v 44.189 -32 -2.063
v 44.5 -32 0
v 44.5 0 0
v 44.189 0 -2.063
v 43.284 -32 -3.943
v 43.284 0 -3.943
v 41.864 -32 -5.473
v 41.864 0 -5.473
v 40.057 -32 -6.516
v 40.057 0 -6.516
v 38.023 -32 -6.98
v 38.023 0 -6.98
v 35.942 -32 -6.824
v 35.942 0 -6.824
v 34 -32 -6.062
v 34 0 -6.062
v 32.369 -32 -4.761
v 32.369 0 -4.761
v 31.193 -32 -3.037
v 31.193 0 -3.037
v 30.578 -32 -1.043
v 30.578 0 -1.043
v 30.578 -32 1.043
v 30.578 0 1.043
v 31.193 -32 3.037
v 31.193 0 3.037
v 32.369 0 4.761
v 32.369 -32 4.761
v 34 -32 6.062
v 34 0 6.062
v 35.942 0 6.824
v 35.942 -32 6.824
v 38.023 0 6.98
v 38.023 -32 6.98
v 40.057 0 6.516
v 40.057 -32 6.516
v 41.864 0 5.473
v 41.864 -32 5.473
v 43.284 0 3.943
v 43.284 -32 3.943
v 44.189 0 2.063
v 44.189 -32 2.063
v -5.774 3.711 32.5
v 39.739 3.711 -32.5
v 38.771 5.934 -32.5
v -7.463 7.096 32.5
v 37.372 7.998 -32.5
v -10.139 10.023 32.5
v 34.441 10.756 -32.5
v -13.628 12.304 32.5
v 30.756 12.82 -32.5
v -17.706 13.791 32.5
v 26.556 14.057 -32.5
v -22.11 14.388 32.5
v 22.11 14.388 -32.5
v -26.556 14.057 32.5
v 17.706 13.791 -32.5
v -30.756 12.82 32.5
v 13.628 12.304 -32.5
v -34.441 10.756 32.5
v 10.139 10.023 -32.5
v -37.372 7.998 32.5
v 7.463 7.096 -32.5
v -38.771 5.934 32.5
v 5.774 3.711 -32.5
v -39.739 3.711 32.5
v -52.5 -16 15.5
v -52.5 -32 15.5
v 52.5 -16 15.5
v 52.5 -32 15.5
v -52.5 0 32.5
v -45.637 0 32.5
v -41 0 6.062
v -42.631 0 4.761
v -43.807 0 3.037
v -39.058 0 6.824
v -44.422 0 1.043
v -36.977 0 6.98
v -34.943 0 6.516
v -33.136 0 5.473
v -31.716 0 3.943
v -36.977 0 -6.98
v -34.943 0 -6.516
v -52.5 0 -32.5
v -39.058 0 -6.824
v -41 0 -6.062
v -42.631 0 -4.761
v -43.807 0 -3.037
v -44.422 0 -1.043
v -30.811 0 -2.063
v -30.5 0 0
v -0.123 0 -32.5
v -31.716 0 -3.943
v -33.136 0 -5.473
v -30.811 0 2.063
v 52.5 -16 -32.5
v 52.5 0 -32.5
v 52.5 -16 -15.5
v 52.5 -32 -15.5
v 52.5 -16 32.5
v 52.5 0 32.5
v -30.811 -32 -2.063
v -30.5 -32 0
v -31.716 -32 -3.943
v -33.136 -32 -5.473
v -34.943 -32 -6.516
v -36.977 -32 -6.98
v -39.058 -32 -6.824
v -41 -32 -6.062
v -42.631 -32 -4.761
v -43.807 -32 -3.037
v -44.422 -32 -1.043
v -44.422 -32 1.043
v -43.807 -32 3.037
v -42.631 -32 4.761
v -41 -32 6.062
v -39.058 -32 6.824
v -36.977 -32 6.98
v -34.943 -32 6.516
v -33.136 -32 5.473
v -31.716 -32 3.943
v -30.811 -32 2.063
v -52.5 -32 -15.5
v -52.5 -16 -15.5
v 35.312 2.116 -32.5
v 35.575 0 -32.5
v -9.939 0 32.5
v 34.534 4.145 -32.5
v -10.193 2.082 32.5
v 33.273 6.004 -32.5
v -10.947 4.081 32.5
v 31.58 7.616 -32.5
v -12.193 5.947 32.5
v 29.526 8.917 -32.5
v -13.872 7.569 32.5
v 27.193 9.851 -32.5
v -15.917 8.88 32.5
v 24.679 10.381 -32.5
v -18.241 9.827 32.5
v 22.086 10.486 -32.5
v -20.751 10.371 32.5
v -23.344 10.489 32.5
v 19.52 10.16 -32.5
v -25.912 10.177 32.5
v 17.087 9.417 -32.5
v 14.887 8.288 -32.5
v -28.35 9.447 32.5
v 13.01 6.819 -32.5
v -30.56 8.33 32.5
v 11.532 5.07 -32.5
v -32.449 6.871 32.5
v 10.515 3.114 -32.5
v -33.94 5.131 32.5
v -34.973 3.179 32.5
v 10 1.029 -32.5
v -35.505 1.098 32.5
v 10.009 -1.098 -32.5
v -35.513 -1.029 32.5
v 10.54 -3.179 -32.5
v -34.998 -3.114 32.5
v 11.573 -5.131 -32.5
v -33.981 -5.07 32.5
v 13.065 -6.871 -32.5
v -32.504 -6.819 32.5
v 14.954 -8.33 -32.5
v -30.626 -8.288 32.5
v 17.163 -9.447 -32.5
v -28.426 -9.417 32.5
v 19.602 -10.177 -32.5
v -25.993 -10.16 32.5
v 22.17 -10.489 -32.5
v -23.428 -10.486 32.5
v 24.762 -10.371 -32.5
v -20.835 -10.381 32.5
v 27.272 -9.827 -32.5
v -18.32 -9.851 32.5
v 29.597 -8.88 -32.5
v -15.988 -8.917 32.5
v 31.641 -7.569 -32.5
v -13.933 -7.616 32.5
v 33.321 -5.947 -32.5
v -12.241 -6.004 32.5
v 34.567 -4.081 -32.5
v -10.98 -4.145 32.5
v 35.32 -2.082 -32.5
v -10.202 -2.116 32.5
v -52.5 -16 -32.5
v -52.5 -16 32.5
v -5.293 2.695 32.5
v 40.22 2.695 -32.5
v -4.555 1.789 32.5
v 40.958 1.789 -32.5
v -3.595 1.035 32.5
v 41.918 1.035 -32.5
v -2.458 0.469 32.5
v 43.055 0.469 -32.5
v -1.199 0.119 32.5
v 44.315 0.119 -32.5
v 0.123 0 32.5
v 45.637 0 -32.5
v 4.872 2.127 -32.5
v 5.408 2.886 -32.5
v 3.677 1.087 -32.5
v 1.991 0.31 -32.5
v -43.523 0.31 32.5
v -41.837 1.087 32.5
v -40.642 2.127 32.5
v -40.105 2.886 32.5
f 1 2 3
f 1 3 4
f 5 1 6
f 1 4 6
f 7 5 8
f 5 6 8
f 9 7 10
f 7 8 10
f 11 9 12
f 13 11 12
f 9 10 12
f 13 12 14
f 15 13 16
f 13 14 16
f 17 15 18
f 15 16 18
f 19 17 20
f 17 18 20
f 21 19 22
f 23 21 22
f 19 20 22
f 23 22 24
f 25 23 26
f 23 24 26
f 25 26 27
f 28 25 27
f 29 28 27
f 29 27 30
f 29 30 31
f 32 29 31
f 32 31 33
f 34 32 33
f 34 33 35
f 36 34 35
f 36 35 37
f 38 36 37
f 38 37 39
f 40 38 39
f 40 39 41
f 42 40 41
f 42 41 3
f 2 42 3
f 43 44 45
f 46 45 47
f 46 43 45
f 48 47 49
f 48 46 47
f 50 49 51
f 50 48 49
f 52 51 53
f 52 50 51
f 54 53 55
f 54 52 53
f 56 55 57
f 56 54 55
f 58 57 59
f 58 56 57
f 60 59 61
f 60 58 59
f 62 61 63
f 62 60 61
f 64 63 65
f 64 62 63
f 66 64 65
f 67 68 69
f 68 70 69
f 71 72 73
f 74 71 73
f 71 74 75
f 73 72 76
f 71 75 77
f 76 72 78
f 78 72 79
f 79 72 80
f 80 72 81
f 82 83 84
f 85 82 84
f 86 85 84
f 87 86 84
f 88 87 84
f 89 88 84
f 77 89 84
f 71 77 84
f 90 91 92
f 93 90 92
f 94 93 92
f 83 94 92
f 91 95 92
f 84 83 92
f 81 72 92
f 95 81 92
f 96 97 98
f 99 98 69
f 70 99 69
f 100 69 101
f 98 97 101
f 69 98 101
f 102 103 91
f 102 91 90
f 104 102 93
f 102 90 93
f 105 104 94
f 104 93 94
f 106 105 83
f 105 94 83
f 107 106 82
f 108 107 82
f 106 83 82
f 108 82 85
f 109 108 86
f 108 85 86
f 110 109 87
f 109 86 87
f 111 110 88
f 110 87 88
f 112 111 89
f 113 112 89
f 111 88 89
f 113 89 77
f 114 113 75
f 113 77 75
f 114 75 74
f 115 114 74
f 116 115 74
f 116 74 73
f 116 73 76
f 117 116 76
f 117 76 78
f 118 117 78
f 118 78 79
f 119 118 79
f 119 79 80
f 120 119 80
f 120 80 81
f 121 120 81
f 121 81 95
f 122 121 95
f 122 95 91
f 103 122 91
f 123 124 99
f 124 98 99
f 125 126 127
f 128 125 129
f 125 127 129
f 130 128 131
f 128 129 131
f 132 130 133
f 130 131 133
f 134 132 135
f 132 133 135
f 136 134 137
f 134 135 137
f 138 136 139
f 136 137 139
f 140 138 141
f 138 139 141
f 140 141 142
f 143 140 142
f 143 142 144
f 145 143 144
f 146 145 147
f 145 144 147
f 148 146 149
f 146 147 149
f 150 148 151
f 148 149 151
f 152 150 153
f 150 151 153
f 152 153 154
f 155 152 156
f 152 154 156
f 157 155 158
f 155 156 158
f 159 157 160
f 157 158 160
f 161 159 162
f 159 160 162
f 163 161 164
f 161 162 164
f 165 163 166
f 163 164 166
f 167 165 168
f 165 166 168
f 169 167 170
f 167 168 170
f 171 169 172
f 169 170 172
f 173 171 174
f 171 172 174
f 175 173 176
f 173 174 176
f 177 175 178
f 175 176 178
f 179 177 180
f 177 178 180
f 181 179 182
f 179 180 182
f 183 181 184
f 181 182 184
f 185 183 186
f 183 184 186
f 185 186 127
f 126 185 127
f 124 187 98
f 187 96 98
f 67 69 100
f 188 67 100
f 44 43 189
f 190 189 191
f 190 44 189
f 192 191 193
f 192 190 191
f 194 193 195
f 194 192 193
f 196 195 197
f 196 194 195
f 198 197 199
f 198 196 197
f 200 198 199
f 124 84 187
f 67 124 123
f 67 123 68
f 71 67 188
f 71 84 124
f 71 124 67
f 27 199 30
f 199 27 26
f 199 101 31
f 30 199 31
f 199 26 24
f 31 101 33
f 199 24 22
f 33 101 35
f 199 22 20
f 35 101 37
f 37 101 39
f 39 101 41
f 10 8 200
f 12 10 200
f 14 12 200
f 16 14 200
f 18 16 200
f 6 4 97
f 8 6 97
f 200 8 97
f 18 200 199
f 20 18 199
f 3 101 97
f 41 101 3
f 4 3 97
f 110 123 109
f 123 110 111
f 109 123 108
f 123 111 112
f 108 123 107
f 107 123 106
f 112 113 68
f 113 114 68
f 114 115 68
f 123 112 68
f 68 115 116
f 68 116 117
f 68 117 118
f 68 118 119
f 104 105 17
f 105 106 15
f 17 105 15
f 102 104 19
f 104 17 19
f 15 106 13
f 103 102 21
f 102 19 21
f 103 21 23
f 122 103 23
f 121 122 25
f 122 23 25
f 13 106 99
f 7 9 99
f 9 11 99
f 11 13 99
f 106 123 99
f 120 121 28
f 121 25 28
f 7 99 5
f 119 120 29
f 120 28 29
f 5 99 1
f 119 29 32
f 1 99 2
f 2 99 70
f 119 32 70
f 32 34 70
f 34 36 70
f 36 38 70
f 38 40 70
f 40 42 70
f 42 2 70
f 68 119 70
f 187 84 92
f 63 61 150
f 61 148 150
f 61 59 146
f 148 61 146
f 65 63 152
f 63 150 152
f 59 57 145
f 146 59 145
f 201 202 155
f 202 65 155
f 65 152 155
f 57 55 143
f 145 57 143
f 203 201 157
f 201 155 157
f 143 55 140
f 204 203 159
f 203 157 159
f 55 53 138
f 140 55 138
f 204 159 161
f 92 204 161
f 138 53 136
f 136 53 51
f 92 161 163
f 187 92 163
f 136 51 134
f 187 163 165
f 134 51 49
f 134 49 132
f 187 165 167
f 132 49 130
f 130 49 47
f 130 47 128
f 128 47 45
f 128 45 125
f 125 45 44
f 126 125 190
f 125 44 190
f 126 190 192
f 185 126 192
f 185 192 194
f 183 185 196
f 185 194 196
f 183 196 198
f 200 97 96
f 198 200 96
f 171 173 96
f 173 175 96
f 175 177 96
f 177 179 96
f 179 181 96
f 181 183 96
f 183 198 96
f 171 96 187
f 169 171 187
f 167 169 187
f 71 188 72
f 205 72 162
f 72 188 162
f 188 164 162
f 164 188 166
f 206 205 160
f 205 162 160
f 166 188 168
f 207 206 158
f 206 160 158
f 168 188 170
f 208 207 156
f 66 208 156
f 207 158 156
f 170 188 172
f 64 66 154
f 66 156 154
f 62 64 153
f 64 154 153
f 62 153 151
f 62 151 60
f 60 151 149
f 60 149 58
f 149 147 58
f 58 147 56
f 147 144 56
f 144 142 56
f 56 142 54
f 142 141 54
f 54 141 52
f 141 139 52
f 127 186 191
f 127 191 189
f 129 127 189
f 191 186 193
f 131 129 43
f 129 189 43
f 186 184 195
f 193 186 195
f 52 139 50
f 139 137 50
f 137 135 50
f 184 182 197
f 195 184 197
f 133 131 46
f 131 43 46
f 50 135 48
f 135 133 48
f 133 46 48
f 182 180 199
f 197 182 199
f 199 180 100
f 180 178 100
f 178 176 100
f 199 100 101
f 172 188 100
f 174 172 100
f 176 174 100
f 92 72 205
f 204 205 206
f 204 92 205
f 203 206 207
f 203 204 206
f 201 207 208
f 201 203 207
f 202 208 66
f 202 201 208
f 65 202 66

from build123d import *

# Parameters (mm, degrees)
BOSS_EXTRUDE1_DEPTH     = 52.5
SKETCH2_R               = 7
CUT_EXTRUDE1_DEPTH      = 105
BOSS_EXTRUDE2_REACH     = 58.735
SKETCH5_R               = 14.397777867
BOSS_EXTRUDE3_REACH     = 58.735
SKETCH5_2_R             = 14.397777867
SKETCH7_R               = 10.5
CUT_EXTRUDE2_DEPTH      = 75
CUT_EXTRUDE2_DEPTH_BACK = 116
FILLET1_R               = 5


with BuildPart() as part:
    # Sketch1 → Boss-Extrude1 (new body, symmetric)
    with BuildSketch(Plane(origin=(0, 0, 0), x_dir=(0, 0, -1), z_dir=(1, 0, 0))):
        Polygon((-32.5, 0), (32.5, 0), (32.5, -16), (15.5, -16), (15.5, -32), (-15.5, -32), (-15.5, -16), (-32.5, -16), align=None)
    extrude(amount=BOSS_EXTRUDE1_DEPTH, both=True)

    # Sketch2 → Cut-Extrude1 (cut)
    with BuildSketch(Plane(origin=(0, 0, 0), x_dir=(1, 0, 0), z_dir=(0, 1, 0))):
        with Locations((37.5, 0)):
            Circle(SKETCH2_R)
        with Locations((-37.5, 0)):
            Circle(SKETCH2_R)
    extrude(amount=-CUT_EXTRUDE1_DEPTH, mode=Mode.SUBTRACT)

    # Boss-Extrude2: up to this face of the body (flat: up to its plane)
    boss_extrude2_end = Plane(part.part.faces().sort_by_distance((0, -8, 32.5))[0])
    # Sketch5 → Boss-Extrude2 (add, up to the picked face)
    with BuildSketch(Plane(origin=(0, 0, 0), x_dir=(0.819152044, 0, 0.573576436), z_dir=(-0.573576436, 0, 0.819152044)), mode=Mode.PRIVATE) as boss_extrude2_sk1:
        Circle(SKETCH5_R)
    boss_extrude2_tool1 = split(extrude(boss_extrude2_sk1.sketch, amount=BOSS_EXTRUDE2_REACH, mode=Mode.PRIVATE), bisect_by=boss_extrude2_end, keep=Keep.BOTH, mode=Mode.PRIVATE)
    add(boss_extrude2_tool1.solids().sort_by_distance((0, 0, 0))[0])

    # Boss-Extrude3: up to this face of the body (flat: up to its plane)
    boss_extrude3_end = Plane(part.part.faces().sort_by_distance((0, -8, -32.5))[0])
    # Sketch5<2> → Boss-Extrude3 (add, up to the picked face)
    with BuildSketch(Plane(origin=(0, 0, 0), x_dir=(0.819152044, 0, 0.573576436), z_dir=(-0.573576436, 0, 0.819152044)), mode=Mode.PRIVATE) as boss_extrude3_sk1:
        Circle(SKETCH5_2_R)
    boss_extrude3_tool1 = split(extrude(boss_extrude3_sk1.sketch, amount=-BOSS_EXTRUDE3_REACH, mode=Mode.PRIVATE), bisect_by=boss_extrude3_end, keep=Keep.BOTH, mode=Mode.PRIVATE)
    add(boss_extrude3_tool1.solids().sort_by_distance((0, 0, 0))[0])

    # Sketch7 → Cut-Extrude2 (cut, two sides)
    with BuildSketch(Plane(origin=(0, 0, 0), x_dir=(0.819152044, 0, 0.573576436), z_dir=(-0.573576436, 0, 0.819152044))) as cut_extrude2_sk:
        Circle(SKETCH7_R)
    extrude(amount=CUT_EXTRUDE2_DEPTH, mode=Mode.SUBTRACT)
    extrude(cut_extrude2_sk.sketch, amount=-CUT_EXTRUDE2_DEPTH_BACK, mode=Mode.SUBTRACT)

    # Fillet1
    fillet1_edges = [part.edges().sort_by_distance(p)[0] for p in [
        (17.576441355, 0, 0),
        (-17.576441355, 0, 0),
    ]]
    fillet(fillet1_edges, radius=FILLET1_R)


solid = part.part
